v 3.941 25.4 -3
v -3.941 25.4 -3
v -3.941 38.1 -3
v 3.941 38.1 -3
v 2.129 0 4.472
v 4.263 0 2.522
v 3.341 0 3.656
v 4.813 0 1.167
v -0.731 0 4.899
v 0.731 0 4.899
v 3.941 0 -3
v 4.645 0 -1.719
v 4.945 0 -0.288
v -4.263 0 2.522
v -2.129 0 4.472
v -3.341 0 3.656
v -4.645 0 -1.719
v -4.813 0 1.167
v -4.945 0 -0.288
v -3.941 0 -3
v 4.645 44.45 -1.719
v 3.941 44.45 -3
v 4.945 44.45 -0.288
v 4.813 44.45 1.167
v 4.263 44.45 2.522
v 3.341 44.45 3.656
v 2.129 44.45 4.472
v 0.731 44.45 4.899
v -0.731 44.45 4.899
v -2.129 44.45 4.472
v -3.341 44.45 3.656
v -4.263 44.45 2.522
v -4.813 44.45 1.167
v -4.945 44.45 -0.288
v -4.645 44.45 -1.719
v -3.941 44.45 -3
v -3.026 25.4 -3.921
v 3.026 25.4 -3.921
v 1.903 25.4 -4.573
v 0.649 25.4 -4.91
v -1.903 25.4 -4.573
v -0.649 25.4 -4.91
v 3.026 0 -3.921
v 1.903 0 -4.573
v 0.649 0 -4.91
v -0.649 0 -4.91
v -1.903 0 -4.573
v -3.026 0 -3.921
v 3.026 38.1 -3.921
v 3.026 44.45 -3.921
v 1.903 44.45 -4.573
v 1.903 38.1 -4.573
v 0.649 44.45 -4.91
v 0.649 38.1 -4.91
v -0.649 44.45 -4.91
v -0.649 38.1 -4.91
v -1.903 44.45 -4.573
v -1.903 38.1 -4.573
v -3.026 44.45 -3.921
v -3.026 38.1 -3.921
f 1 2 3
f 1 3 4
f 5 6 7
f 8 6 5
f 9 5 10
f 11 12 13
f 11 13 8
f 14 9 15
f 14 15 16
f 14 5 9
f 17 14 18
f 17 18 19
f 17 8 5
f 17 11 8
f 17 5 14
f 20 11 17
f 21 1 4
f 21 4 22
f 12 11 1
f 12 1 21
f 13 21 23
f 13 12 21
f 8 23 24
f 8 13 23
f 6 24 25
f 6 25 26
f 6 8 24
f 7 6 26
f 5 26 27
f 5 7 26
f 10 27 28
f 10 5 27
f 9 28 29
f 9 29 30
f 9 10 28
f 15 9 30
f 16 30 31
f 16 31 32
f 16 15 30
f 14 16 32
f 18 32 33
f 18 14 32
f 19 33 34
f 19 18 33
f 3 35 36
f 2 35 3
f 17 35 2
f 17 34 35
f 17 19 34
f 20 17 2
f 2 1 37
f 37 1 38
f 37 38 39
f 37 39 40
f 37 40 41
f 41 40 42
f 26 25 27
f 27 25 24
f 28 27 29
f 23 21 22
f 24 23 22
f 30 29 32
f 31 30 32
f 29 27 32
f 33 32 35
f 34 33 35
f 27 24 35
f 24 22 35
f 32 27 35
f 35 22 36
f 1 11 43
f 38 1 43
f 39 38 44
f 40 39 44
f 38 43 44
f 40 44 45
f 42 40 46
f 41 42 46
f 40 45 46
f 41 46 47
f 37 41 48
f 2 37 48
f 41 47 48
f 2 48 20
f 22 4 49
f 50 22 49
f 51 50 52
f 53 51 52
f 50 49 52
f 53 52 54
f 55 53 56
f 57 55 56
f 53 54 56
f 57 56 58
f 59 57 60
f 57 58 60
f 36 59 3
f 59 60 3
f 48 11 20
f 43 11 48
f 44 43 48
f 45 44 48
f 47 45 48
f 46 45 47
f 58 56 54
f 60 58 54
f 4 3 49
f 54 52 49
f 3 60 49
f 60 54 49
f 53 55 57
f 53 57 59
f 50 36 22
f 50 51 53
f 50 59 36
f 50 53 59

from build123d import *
from build123d.topology import SkipClean

# Parameters (mm, degrees)
BOSS_EXTRUDE1_DEPTH = 44.45
BOSS_EXTRUDE2_DEPTH = 25.4
BOSS_EXTRUDE3_START = -6.35
BOSS_EXTRUDE3_DEPTH = 6.35


with BuildPart() as part:
    # Sketch1 → Boss-Extrude1 (new body)
    with BuildSketch(Plane(origin=(0, 0, 0), x_dir=(1, 0, 0), z_dir=(0, 1, 0))):
        with BuildLine():
            Line((-3.941092361, 3), (3.941092361, 3))
            ThreePointArc((3.941092361, 3), (0, -4.953), (-3.941092361, 3))
        make_face()
    extrude(amount=BOSS_EXTRUDE1_DEPTH)

    # Sketch3 → Boss-Extrude2 (add)
    with SkipClean():  # the faces are left unmerged after this step: merging them gives an invalid solid
        with BuildSketch(Plane.XZ):
            with BuildLine():
                Line((-3.941092361, -3), (3.941092361, -3))
                ThreePointArc((3.941092361, -3), (0, -4.953), (-3.941092361, -3))
            make_face()
        extrude(amount=-BOSS_EXTRUDE2_DEPTH)

    # Sketch4 → Boss-Extrude3 (add)
    with SkipClean():  # the faces are left unmerged after this step: merging them gives an invalid solid
        with BuildSketch(Plane(origin=(0, 44.45, 0), x_dir=(1, 0, 0), z_dir=(0, 1, 0)).offset(BOSS_EXTRUDE3_START)):
            with BuildLine():
                Line((-3.941092361, 3), (3.941092361, 3))
                ThreePointArc((3.941092361, 3), (0, 4.953), (-3.941092361, 3))
            make_face()
        extrude(amount=BOSS_EXTRUDE3_DEPTH)


solid = part.part
